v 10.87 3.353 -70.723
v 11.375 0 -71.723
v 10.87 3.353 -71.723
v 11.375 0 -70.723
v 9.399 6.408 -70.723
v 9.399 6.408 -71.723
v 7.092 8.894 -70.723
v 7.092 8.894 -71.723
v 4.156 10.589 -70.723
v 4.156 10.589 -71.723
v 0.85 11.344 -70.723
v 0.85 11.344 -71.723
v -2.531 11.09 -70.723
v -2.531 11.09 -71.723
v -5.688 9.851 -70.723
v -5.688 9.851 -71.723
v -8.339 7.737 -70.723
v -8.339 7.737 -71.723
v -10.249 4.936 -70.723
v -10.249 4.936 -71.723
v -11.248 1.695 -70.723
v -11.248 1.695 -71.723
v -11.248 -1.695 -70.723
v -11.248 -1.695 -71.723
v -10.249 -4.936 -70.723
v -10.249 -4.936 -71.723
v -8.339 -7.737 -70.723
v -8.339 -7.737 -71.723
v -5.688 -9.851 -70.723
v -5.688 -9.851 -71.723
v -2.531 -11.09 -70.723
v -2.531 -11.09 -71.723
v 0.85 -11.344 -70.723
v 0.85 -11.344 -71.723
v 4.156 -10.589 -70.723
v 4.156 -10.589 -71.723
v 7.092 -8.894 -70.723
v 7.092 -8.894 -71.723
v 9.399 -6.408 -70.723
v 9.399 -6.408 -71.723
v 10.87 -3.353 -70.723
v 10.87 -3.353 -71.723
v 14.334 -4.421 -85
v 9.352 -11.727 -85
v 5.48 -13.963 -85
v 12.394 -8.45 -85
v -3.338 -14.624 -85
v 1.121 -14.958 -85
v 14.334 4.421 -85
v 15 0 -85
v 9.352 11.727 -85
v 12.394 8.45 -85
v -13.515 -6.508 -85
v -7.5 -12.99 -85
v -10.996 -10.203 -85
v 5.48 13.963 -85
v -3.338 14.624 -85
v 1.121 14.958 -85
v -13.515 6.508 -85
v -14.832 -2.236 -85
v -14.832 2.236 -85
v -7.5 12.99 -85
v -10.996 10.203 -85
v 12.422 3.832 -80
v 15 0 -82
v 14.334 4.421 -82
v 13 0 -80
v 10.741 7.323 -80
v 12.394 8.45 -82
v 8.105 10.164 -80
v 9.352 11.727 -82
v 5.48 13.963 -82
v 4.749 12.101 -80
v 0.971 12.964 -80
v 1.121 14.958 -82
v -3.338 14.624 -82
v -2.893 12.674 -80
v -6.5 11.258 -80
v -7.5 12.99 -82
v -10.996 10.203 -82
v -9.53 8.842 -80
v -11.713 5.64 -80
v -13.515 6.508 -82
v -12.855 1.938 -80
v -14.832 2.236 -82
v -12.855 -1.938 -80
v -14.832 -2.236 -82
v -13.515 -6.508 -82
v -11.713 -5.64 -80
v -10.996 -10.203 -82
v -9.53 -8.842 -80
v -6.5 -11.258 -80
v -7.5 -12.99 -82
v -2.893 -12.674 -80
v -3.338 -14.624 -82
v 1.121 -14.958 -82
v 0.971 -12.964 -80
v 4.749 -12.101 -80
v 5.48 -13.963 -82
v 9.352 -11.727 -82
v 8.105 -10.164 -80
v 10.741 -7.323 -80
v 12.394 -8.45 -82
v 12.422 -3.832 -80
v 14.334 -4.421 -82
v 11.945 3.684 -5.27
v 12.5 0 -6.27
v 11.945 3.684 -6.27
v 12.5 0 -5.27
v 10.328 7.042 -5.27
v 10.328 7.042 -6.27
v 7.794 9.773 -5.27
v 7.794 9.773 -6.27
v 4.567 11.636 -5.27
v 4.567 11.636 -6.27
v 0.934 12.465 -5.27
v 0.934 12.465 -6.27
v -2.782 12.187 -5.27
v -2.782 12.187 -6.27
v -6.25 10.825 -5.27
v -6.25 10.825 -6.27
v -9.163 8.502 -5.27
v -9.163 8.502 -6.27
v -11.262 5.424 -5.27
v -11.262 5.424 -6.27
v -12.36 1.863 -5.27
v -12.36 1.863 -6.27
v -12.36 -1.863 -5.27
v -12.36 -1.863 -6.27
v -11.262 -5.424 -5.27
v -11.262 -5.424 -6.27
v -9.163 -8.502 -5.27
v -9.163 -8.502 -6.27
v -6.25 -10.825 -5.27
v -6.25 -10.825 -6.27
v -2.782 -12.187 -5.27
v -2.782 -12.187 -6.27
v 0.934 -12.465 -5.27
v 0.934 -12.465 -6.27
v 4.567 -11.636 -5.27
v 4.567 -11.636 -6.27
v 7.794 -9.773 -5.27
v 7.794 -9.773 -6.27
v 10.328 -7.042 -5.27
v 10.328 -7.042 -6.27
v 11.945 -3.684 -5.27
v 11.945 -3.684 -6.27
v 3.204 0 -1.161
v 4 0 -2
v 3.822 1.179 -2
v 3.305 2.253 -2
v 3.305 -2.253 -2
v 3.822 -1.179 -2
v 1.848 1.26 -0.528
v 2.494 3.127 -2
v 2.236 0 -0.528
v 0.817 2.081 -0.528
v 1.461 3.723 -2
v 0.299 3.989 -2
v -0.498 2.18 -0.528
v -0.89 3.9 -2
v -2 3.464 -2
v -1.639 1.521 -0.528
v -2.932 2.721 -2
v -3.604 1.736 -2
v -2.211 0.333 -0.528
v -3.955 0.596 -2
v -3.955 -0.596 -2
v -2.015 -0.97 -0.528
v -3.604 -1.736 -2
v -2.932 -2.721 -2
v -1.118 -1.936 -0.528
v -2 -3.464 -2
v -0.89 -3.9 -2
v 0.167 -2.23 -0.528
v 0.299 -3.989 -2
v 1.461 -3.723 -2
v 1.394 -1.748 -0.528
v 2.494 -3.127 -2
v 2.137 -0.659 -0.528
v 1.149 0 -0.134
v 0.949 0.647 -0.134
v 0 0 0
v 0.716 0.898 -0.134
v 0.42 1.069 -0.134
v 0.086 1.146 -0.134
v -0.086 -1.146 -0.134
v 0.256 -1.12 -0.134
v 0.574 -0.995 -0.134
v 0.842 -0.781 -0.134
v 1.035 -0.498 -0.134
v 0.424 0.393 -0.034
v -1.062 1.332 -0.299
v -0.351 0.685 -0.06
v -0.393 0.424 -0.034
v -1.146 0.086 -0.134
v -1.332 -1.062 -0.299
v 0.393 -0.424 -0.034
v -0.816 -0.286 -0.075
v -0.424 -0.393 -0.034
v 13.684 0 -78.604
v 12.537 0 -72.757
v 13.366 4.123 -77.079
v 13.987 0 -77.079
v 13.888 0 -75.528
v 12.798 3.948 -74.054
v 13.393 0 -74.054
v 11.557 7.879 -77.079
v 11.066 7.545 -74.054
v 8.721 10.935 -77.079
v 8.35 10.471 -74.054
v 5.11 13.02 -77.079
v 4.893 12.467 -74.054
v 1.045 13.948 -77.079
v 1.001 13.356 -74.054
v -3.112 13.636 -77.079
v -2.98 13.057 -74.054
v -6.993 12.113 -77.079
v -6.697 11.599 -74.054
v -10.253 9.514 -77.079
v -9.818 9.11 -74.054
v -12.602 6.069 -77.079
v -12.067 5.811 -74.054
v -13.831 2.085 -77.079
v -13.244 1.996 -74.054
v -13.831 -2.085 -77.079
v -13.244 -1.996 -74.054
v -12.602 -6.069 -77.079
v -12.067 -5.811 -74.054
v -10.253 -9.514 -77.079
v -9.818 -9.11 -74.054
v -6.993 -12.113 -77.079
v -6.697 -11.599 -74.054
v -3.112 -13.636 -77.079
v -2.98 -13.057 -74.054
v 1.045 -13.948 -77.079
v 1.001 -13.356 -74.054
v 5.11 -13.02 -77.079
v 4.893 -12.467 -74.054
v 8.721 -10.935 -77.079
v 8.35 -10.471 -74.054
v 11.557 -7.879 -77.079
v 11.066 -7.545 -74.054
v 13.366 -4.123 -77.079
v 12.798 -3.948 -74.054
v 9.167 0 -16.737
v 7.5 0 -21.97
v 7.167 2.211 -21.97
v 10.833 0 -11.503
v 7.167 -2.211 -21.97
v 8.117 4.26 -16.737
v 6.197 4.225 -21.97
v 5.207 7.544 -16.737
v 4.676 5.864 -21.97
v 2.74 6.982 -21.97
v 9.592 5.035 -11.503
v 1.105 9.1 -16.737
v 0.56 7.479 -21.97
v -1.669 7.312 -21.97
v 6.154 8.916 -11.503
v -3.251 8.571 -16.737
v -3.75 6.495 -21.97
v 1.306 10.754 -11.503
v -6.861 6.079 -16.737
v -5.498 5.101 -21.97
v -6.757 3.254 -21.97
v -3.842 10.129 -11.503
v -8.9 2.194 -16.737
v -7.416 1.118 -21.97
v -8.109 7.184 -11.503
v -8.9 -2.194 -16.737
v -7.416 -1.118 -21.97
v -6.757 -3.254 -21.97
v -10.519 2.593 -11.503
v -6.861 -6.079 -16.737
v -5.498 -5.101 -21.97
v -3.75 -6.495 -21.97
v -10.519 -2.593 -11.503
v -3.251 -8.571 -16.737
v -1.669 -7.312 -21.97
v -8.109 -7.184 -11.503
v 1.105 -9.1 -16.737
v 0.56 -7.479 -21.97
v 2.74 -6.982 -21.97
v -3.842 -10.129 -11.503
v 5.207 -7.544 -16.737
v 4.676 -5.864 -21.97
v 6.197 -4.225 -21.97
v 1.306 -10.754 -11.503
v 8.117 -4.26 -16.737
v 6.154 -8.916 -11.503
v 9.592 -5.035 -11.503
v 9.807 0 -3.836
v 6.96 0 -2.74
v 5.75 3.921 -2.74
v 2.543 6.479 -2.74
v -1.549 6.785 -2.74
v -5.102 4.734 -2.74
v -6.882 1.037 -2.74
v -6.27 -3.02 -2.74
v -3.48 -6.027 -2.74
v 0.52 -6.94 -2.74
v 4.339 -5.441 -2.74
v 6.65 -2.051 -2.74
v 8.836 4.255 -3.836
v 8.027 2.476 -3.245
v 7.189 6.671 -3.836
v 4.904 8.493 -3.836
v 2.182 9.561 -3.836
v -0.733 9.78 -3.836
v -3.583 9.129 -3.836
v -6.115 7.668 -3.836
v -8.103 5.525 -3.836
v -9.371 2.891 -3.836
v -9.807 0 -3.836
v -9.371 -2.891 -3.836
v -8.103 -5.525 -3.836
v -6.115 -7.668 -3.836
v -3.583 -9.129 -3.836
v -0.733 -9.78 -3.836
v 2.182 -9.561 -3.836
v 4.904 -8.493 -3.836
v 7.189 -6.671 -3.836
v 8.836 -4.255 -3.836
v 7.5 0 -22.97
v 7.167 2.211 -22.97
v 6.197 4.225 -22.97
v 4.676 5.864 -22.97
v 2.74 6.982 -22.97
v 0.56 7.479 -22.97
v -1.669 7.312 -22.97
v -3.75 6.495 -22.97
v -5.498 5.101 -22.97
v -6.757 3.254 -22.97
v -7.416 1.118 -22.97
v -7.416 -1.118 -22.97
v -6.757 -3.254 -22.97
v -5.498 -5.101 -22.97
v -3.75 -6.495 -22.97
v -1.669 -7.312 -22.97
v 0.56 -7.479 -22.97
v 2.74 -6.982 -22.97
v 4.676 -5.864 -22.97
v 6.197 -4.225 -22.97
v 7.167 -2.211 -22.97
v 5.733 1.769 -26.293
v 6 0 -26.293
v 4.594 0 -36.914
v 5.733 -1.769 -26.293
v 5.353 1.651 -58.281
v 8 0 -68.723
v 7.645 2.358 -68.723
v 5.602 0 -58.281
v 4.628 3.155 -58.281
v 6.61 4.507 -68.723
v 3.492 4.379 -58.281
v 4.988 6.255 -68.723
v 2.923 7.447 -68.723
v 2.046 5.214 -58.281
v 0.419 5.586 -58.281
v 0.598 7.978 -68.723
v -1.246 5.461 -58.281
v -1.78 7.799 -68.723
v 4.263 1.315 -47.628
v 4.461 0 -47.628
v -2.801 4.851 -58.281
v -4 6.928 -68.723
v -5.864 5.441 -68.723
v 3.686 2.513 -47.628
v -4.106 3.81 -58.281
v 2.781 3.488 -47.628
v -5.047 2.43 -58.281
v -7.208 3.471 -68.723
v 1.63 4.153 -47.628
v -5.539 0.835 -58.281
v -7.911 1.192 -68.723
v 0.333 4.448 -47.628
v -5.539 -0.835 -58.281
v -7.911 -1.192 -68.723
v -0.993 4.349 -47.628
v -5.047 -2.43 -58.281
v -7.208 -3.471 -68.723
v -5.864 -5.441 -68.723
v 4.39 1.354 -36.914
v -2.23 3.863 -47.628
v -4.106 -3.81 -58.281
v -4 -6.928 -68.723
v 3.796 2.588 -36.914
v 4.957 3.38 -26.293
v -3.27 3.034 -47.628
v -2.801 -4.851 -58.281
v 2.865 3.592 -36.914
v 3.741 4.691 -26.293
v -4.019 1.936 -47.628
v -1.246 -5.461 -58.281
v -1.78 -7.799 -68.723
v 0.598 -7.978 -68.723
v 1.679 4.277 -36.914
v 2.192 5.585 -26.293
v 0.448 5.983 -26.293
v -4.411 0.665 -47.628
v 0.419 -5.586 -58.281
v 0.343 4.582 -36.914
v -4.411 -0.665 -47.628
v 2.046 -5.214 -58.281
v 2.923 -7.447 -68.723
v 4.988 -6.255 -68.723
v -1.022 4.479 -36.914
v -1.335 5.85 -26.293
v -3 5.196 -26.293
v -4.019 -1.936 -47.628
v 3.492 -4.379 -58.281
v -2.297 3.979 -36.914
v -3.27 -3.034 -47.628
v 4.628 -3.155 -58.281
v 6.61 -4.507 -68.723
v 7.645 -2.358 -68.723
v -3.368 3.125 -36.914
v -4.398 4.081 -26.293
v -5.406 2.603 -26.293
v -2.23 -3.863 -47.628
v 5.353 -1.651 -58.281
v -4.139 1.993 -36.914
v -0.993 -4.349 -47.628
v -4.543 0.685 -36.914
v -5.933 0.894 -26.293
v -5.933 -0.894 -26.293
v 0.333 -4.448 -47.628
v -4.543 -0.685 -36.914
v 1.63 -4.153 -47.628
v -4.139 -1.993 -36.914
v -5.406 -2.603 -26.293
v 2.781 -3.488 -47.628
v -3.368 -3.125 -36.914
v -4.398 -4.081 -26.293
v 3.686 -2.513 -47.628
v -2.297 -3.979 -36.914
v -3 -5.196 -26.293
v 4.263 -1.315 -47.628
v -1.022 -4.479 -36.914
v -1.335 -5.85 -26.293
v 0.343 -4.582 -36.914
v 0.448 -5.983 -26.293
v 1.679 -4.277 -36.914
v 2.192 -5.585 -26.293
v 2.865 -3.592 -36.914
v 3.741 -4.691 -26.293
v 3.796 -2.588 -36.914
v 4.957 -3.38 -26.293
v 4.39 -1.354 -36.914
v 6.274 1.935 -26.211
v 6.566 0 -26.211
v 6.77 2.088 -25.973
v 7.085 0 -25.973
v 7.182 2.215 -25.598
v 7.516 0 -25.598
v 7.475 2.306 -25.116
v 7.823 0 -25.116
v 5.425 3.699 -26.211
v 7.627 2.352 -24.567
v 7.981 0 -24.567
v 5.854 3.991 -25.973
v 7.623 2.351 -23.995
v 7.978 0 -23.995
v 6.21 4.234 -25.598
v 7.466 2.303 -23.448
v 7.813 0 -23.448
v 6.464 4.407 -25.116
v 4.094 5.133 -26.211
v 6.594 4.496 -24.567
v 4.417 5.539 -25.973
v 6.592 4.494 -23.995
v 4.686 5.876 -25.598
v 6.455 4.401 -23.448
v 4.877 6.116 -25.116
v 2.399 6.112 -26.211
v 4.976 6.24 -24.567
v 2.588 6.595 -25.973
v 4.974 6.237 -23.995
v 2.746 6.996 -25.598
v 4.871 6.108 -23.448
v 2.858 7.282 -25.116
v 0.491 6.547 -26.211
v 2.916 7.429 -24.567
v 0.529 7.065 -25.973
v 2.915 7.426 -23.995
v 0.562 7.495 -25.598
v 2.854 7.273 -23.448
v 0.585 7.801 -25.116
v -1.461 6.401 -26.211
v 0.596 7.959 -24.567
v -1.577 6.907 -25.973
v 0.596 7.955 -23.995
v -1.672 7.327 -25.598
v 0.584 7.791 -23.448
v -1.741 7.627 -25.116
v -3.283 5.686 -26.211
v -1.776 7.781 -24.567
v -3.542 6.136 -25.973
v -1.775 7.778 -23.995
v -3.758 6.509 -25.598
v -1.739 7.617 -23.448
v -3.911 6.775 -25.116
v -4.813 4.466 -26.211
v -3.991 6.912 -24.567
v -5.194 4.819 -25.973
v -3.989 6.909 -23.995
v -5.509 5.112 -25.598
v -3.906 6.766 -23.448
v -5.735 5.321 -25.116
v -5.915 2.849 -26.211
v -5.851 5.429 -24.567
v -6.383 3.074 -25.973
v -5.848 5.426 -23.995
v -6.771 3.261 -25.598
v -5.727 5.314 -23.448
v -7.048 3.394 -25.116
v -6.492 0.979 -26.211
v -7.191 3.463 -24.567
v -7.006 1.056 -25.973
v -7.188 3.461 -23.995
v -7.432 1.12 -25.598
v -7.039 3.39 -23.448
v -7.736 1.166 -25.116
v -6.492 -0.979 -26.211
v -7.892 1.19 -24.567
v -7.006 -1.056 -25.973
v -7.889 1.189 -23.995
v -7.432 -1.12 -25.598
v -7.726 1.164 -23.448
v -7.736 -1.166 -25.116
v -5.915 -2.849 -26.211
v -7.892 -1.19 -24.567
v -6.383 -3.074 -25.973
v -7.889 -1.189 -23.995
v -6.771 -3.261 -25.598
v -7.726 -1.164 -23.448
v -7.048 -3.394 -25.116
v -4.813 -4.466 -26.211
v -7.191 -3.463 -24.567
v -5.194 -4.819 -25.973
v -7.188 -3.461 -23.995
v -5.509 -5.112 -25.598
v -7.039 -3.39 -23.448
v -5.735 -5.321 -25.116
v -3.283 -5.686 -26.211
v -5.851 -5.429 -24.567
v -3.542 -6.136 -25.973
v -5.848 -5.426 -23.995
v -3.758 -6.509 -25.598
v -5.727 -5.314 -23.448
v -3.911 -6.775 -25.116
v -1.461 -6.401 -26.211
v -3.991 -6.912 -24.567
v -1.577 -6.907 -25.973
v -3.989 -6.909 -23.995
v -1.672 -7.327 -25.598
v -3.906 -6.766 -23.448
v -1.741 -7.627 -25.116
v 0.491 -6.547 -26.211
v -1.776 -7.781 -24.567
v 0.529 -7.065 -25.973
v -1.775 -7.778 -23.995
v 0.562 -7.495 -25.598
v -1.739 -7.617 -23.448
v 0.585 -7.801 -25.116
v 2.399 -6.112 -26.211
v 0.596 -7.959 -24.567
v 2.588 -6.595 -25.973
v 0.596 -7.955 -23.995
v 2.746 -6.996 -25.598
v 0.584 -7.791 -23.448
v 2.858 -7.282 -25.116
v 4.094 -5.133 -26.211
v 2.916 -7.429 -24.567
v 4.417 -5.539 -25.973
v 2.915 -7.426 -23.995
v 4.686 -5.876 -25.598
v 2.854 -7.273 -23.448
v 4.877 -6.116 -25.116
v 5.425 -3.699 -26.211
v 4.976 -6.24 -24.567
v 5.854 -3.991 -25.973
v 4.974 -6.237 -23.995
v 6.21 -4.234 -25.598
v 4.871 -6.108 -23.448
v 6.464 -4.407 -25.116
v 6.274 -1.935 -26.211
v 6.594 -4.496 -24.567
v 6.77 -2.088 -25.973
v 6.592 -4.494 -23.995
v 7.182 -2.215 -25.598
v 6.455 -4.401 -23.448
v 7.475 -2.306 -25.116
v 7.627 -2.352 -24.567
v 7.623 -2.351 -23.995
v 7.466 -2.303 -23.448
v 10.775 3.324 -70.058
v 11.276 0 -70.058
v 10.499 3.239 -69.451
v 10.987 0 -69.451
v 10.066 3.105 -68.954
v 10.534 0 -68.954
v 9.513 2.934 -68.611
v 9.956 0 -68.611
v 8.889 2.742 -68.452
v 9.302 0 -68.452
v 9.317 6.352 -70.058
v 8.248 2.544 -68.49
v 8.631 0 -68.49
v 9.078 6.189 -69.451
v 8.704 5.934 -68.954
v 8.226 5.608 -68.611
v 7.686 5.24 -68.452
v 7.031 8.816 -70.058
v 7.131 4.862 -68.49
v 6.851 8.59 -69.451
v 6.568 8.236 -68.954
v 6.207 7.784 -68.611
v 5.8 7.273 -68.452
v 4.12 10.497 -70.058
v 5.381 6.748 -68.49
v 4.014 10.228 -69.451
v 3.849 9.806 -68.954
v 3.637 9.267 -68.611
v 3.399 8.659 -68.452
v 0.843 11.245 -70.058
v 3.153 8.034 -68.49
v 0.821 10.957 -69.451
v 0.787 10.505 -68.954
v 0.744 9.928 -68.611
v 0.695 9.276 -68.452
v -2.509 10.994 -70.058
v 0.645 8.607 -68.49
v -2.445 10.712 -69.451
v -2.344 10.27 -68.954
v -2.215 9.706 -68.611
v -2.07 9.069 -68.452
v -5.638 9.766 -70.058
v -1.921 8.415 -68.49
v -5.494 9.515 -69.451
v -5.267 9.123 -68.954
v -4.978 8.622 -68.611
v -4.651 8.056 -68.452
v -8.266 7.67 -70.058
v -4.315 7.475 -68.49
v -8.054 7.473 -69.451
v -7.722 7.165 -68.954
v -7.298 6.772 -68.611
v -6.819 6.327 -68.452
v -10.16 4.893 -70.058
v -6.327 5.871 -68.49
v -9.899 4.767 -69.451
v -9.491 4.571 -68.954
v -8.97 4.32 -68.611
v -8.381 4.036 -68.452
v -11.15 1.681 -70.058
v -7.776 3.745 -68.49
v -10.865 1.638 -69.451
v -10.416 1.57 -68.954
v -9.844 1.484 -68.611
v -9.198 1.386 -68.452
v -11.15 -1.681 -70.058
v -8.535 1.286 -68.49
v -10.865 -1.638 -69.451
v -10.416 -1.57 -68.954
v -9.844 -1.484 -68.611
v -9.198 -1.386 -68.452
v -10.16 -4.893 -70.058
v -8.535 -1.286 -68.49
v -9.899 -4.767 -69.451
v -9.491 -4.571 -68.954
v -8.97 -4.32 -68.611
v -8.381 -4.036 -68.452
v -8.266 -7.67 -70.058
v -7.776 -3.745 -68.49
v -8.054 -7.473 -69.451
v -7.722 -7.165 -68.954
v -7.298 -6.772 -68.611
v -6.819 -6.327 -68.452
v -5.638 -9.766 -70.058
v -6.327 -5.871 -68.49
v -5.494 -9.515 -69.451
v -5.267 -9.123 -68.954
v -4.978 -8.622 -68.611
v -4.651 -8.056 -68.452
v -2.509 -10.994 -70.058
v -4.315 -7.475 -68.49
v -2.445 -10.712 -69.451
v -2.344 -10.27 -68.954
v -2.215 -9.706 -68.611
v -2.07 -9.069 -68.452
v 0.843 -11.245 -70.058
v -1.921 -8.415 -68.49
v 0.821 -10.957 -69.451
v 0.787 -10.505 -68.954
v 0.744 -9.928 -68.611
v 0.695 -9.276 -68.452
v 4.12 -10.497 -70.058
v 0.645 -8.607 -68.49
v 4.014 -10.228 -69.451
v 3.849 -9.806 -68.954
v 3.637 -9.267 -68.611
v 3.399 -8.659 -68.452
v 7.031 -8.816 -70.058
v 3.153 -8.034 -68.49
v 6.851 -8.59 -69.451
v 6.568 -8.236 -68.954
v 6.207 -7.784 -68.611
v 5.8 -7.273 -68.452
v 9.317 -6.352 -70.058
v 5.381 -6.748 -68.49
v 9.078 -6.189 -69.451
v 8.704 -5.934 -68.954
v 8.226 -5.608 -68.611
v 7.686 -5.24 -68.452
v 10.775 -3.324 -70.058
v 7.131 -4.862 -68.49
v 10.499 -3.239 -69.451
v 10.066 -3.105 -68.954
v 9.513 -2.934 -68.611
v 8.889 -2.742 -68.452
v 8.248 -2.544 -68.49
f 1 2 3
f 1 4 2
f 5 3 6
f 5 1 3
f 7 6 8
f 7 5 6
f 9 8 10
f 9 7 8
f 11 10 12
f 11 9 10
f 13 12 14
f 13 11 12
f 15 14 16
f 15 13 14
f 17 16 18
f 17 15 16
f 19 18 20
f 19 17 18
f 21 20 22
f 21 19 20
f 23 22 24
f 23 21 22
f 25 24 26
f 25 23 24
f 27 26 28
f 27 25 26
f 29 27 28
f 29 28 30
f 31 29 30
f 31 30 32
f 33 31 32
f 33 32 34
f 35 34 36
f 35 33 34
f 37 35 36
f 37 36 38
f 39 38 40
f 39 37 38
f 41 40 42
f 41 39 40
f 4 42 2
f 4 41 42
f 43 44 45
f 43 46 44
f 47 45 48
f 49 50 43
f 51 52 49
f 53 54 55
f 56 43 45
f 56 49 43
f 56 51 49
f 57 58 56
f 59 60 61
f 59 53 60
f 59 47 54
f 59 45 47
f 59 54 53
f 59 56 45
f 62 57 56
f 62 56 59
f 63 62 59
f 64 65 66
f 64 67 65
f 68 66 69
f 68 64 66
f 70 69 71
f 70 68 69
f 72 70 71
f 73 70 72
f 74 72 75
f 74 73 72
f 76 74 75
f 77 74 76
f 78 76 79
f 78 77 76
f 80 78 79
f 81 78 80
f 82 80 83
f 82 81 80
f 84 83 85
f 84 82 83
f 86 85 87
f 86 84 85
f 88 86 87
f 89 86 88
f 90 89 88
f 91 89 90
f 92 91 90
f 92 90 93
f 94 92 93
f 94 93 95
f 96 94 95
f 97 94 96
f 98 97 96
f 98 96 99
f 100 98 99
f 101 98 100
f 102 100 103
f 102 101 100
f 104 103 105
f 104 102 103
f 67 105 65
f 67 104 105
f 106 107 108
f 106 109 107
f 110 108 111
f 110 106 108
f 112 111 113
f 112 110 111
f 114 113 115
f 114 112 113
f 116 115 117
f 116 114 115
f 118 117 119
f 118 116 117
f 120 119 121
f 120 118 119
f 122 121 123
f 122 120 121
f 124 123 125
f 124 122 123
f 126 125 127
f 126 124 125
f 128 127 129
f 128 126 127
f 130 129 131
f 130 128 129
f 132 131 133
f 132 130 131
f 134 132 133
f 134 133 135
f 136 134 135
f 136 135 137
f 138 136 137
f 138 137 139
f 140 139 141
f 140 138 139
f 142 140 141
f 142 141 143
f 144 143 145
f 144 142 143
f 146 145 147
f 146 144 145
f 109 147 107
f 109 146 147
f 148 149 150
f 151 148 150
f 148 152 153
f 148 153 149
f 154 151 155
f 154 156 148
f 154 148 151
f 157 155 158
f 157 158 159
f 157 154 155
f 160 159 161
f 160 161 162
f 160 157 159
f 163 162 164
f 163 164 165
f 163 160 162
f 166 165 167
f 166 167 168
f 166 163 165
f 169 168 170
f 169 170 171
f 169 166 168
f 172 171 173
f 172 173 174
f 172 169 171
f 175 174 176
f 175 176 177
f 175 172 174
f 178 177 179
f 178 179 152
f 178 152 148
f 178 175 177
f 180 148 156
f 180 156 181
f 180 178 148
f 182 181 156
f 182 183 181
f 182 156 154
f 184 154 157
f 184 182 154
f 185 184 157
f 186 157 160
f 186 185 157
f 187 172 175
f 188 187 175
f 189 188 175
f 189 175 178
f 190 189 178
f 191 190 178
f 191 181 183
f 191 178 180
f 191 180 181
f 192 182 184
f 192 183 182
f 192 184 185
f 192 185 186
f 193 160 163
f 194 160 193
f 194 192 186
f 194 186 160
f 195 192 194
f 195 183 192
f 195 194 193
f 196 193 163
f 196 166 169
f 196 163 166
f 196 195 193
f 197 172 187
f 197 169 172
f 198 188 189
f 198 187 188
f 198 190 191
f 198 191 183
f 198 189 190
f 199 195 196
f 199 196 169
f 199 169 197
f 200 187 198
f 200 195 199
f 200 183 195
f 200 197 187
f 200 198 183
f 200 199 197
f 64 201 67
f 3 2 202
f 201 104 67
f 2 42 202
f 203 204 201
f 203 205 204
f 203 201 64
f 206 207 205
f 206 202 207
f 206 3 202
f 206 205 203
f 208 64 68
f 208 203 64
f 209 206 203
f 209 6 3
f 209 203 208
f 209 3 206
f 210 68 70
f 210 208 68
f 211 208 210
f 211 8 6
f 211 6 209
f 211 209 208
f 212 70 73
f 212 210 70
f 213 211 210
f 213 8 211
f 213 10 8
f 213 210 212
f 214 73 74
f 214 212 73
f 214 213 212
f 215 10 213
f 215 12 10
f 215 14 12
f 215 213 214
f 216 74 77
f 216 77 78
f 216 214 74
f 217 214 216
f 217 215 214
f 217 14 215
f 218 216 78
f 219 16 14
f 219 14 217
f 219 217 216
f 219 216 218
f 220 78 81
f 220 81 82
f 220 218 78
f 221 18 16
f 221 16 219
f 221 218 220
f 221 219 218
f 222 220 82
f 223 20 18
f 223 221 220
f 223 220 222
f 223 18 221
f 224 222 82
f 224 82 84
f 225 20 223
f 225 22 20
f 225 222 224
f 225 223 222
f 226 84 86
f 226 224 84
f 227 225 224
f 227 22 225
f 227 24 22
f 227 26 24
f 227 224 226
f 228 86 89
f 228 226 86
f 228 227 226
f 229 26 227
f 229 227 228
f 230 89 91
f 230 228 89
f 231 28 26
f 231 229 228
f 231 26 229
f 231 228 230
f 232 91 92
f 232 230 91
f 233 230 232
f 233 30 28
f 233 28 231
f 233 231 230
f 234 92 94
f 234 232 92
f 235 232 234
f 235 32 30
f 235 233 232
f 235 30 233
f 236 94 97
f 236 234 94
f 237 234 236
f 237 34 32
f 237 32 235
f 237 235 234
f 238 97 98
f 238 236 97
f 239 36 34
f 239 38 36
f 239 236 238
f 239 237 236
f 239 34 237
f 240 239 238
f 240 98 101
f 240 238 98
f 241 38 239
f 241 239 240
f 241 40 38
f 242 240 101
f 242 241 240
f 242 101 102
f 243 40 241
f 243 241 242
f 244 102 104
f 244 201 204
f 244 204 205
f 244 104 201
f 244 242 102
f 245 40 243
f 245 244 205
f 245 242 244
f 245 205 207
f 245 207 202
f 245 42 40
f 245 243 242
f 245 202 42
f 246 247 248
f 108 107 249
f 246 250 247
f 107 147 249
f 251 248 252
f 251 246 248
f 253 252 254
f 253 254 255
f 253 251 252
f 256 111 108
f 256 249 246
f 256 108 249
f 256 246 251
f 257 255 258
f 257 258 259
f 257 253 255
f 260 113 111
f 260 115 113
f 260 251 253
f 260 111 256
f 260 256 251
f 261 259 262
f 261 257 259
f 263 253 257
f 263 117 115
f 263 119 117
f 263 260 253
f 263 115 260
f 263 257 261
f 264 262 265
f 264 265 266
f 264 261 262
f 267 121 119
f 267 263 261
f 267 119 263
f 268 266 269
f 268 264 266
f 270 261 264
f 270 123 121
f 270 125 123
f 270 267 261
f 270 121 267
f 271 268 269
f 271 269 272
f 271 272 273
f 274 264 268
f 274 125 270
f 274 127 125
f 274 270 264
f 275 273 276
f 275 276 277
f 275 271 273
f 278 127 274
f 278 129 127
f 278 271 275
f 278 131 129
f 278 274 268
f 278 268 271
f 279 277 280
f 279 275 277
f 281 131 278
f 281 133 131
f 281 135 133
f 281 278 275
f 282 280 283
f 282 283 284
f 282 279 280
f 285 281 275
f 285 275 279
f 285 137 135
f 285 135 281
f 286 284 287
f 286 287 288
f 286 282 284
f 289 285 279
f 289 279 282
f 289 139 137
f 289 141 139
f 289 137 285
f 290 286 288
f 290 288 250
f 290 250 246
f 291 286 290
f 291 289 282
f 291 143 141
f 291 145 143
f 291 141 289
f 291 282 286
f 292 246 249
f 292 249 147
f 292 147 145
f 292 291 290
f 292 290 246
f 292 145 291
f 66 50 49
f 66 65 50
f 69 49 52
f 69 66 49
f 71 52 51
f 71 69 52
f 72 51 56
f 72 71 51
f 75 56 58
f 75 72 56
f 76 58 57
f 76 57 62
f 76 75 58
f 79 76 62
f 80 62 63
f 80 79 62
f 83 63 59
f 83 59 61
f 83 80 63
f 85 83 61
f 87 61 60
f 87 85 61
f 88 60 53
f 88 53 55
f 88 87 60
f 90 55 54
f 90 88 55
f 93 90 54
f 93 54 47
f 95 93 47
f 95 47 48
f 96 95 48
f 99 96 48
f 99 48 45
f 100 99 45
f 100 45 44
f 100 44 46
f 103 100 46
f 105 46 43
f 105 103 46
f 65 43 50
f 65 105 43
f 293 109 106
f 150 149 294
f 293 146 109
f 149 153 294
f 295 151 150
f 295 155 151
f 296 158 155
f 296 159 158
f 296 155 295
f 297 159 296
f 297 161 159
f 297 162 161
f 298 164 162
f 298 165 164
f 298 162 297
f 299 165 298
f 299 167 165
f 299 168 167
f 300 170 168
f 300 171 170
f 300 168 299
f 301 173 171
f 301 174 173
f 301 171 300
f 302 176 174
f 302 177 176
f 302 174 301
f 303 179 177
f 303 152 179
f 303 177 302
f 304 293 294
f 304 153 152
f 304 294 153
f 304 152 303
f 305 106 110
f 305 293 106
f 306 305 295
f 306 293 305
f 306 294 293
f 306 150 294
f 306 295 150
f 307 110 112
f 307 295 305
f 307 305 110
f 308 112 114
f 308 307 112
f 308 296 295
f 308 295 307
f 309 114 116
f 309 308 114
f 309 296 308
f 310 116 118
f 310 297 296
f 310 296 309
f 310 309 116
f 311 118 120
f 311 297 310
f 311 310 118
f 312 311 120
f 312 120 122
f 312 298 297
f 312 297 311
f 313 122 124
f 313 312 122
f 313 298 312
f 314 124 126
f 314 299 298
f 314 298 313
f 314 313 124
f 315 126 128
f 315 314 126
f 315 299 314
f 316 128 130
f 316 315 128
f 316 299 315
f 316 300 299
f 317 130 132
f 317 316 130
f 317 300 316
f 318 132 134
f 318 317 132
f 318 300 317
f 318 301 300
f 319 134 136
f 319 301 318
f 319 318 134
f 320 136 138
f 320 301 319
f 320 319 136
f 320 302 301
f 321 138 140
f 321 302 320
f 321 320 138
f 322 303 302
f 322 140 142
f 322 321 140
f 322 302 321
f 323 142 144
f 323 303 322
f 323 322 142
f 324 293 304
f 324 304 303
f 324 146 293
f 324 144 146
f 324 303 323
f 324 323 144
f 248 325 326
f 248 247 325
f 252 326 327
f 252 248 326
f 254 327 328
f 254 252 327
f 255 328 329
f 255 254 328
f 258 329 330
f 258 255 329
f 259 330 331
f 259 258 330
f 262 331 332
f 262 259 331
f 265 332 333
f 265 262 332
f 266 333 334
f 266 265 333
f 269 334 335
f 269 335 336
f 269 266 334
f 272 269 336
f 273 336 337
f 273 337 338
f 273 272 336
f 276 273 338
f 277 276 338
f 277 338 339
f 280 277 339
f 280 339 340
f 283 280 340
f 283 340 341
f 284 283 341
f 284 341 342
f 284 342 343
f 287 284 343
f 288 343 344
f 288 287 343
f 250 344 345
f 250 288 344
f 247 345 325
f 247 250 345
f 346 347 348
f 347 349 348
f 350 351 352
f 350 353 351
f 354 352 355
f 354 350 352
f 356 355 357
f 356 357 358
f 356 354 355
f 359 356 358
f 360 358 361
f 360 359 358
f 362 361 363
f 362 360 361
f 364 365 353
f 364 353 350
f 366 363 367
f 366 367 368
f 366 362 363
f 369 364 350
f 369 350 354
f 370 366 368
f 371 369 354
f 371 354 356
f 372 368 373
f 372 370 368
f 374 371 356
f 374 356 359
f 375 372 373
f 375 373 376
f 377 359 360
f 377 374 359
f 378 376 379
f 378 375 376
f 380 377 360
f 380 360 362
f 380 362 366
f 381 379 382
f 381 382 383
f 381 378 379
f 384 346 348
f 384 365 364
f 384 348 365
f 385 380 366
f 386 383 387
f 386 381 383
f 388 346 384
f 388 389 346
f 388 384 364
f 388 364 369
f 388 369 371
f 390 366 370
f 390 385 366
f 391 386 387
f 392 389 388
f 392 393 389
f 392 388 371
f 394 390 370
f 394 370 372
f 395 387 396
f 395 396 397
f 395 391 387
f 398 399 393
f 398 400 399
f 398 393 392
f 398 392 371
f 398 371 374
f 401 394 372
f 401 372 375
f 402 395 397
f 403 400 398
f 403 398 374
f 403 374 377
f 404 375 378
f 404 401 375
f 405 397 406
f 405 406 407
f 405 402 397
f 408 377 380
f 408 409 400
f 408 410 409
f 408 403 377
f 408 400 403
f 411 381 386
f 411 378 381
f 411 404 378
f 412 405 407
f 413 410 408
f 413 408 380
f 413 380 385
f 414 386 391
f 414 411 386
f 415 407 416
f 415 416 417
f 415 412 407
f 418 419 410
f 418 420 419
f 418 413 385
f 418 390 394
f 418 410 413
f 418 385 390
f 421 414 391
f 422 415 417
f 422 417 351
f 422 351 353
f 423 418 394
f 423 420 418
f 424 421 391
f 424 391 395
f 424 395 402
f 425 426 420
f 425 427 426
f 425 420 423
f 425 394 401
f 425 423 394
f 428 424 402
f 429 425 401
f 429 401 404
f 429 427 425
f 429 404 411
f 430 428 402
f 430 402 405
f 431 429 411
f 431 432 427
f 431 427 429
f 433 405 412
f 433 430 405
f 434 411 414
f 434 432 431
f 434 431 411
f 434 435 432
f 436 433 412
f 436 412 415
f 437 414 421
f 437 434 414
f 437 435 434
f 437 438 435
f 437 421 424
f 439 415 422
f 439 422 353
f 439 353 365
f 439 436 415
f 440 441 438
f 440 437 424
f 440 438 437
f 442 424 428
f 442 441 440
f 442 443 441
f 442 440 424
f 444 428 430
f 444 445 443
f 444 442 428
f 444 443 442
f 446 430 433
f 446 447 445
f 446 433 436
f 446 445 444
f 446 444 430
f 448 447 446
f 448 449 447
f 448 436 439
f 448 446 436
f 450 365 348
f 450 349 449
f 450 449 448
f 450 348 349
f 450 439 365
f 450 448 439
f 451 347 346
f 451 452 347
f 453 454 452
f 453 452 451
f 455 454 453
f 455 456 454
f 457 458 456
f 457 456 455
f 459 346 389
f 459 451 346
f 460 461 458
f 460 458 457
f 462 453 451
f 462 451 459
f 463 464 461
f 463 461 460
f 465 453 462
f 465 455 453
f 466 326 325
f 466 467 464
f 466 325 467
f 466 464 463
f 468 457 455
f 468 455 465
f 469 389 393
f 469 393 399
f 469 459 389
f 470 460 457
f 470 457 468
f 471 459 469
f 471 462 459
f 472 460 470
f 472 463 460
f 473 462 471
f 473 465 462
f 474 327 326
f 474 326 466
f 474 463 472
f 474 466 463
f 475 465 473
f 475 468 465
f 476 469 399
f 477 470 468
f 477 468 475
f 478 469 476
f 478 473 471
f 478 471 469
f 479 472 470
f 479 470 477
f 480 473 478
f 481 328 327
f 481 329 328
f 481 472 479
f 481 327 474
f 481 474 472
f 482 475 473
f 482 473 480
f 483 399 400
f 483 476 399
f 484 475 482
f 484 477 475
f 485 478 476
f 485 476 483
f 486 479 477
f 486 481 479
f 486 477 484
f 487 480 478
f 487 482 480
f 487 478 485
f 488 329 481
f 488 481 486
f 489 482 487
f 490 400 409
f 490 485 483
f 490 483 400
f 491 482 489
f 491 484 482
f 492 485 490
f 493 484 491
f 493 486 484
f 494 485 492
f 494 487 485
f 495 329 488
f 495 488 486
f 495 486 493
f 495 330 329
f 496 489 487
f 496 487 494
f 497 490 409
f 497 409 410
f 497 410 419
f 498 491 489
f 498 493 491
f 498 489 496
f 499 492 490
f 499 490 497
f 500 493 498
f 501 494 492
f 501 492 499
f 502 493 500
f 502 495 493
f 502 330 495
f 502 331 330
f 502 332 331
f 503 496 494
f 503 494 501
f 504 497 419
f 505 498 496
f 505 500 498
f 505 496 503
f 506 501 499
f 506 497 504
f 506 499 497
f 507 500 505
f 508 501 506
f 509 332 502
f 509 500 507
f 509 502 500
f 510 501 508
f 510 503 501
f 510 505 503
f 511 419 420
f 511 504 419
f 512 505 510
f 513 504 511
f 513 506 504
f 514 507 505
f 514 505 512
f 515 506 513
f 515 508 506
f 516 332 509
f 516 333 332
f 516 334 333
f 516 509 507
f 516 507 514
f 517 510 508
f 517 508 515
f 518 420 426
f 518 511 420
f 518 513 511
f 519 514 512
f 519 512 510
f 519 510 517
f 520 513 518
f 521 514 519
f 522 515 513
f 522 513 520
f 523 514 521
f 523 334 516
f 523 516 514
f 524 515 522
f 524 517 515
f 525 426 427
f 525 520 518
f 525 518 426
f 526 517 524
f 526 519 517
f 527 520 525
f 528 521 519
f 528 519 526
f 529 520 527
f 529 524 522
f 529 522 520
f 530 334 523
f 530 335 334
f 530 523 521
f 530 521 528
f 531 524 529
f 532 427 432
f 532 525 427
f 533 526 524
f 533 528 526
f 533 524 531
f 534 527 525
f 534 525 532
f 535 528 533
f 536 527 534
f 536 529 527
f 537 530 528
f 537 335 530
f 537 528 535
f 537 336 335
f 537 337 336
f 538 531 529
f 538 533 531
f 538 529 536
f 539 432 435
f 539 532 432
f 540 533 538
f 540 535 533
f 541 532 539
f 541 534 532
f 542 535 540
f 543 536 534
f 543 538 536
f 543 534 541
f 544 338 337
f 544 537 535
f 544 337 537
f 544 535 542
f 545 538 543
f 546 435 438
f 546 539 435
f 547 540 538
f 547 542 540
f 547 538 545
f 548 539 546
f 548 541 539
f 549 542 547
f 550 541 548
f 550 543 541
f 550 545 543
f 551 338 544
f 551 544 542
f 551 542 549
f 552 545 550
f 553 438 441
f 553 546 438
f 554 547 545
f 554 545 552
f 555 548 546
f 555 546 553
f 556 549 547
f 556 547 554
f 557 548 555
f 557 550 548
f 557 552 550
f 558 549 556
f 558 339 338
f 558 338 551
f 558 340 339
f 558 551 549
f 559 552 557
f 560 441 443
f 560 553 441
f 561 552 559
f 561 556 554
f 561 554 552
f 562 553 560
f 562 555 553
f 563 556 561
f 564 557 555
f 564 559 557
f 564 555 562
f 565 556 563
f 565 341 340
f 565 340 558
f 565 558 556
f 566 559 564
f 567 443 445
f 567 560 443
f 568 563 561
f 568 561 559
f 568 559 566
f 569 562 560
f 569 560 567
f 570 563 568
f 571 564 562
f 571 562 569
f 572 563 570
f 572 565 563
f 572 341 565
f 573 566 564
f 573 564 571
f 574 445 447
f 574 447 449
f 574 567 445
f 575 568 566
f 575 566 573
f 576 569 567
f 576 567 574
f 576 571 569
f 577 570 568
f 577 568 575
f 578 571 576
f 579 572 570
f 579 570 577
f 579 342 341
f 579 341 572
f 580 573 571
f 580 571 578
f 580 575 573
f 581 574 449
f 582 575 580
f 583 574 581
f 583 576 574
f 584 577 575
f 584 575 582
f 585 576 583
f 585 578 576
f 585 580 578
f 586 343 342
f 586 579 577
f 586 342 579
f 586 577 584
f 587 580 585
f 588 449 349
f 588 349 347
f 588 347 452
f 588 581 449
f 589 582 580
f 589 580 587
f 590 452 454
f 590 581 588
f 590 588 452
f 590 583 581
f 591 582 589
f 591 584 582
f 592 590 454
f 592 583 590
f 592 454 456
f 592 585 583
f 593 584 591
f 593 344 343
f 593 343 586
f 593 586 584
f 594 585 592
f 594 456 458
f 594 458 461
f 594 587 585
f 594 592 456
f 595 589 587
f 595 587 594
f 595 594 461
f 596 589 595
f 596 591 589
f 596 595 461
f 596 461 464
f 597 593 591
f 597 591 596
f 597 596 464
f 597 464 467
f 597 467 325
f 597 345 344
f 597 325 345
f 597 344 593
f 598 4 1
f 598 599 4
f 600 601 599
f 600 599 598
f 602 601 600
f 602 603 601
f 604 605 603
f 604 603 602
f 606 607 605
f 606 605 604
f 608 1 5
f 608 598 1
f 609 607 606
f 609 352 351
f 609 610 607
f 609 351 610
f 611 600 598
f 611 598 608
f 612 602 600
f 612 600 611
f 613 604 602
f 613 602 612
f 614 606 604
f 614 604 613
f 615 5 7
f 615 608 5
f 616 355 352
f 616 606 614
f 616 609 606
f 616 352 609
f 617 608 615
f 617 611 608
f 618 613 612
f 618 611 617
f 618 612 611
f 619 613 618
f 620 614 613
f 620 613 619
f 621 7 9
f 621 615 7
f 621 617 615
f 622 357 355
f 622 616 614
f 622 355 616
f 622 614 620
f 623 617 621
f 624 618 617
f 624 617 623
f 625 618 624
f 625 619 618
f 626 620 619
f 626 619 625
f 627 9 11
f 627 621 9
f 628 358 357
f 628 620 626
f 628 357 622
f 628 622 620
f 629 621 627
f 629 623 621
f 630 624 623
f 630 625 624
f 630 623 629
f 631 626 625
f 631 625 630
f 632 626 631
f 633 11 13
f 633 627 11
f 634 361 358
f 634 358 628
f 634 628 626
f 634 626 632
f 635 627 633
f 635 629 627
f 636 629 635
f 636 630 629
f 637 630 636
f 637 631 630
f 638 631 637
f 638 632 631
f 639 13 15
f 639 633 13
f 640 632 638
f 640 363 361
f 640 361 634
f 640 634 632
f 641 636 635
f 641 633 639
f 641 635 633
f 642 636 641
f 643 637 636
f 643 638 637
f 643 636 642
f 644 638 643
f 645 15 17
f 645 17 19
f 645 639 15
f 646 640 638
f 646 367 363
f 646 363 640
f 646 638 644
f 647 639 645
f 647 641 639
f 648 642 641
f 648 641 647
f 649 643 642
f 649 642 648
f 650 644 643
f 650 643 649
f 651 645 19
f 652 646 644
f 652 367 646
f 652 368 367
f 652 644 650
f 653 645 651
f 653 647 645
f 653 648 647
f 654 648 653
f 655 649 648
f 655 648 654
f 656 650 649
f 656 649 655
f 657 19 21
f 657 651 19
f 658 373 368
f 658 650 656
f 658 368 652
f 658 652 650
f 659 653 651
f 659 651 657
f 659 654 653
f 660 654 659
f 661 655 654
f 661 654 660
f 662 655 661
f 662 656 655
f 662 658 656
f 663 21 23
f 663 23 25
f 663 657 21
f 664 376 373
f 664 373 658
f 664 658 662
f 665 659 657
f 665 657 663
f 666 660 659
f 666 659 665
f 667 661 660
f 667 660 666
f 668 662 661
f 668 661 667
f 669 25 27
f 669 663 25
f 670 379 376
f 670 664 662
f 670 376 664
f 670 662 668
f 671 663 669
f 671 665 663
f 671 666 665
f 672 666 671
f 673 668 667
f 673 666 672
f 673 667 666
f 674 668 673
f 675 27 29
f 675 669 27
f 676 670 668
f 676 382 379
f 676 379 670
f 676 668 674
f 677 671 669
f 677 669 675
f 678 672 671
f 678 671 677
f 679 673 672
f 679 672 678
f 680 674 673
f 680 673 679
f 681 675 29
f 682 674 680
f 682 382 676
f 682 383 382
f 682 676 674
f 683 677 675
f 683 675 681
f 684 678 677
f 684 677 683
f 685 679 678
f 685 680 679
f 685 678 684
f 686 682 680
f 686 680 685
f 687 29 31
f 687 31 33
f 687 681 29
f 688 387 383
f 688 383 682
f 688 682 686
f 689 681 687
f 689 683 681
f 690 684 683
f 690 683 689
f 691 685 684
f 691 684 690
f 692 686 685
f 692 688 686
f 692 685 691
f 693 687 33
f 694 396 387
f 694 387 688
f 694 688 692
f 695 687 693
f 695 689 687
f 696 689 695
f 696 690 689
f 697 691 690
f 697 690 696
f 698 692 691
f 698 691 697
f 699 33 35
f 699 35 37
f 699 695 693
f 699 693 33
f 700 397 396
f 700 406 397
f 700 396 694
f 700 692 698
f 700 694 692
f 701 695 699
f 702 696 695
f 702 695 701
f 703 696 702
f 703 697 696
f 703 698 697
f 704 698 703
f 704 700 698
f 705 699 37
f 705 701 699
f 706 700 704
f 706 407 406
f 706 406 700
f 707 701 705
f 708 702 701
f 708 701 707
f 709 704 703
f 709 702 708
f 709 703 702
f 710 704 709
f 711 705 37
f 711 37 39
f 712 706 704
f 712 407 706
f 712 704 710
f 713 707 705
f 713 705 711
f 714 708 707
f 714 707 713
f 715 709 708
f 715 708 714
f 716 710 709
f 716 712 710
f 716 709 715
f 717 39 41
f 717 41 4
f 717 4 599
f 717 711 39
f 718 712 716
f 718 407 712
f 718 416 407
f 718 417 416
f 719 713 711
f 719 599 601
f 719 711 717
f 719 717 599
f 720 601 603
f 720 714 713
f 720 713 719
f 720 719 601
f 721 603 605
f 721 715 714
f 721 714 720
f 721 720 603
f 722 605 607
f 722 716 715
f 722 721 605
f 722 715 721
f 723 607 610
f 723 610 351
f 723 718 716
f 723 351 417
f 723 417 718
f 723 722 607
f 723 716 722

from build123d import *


with BuildPart() as f1:
    # F0 (on Front) → F1 (revolve)
    with BuildSketch(Plane.XZ):
        with BuildLine():
            Line((12.5, -6.27), (12.5, -5.27))
            ThreePointArc((12.5, -5.27), (8.40016, -3.244675), (4, -2))
            ThreePointArc((4, -2), (2.236068, -0.527864), (0, 0))
            Line((0, 0), (0, -85))
            Line((0, -85), (15, -85))
            Line((15, -85), (15, -82))
            Line((15, -82), (13, -80))
            ThreePointArc((13, -80), (13.887665, -75.527781), (11.375418, -71.722876))
            Line((11.375418, -71.722876), (11.375418, -70.722876))
            ThreePointArc((11.375418, -70.722876), (10.257549, -68.761152), (8, -68.722876))
            ThreePointArc((8, -68.722876), (4.460945, -47.627558), (6, -26.292876))
            ThreePointArc((6, -26.292876), (7.822876, -25.115751), (7.5, -22.97))
            Line((7.5, -22.97), (7.5, -21.97))
            Line((7.5, -21.97), (12.5, -6.27))
        make_face()
    revolve(axis=Axis((0, 0, -42.5), (0, 0, 1)))


solid = f1.part
